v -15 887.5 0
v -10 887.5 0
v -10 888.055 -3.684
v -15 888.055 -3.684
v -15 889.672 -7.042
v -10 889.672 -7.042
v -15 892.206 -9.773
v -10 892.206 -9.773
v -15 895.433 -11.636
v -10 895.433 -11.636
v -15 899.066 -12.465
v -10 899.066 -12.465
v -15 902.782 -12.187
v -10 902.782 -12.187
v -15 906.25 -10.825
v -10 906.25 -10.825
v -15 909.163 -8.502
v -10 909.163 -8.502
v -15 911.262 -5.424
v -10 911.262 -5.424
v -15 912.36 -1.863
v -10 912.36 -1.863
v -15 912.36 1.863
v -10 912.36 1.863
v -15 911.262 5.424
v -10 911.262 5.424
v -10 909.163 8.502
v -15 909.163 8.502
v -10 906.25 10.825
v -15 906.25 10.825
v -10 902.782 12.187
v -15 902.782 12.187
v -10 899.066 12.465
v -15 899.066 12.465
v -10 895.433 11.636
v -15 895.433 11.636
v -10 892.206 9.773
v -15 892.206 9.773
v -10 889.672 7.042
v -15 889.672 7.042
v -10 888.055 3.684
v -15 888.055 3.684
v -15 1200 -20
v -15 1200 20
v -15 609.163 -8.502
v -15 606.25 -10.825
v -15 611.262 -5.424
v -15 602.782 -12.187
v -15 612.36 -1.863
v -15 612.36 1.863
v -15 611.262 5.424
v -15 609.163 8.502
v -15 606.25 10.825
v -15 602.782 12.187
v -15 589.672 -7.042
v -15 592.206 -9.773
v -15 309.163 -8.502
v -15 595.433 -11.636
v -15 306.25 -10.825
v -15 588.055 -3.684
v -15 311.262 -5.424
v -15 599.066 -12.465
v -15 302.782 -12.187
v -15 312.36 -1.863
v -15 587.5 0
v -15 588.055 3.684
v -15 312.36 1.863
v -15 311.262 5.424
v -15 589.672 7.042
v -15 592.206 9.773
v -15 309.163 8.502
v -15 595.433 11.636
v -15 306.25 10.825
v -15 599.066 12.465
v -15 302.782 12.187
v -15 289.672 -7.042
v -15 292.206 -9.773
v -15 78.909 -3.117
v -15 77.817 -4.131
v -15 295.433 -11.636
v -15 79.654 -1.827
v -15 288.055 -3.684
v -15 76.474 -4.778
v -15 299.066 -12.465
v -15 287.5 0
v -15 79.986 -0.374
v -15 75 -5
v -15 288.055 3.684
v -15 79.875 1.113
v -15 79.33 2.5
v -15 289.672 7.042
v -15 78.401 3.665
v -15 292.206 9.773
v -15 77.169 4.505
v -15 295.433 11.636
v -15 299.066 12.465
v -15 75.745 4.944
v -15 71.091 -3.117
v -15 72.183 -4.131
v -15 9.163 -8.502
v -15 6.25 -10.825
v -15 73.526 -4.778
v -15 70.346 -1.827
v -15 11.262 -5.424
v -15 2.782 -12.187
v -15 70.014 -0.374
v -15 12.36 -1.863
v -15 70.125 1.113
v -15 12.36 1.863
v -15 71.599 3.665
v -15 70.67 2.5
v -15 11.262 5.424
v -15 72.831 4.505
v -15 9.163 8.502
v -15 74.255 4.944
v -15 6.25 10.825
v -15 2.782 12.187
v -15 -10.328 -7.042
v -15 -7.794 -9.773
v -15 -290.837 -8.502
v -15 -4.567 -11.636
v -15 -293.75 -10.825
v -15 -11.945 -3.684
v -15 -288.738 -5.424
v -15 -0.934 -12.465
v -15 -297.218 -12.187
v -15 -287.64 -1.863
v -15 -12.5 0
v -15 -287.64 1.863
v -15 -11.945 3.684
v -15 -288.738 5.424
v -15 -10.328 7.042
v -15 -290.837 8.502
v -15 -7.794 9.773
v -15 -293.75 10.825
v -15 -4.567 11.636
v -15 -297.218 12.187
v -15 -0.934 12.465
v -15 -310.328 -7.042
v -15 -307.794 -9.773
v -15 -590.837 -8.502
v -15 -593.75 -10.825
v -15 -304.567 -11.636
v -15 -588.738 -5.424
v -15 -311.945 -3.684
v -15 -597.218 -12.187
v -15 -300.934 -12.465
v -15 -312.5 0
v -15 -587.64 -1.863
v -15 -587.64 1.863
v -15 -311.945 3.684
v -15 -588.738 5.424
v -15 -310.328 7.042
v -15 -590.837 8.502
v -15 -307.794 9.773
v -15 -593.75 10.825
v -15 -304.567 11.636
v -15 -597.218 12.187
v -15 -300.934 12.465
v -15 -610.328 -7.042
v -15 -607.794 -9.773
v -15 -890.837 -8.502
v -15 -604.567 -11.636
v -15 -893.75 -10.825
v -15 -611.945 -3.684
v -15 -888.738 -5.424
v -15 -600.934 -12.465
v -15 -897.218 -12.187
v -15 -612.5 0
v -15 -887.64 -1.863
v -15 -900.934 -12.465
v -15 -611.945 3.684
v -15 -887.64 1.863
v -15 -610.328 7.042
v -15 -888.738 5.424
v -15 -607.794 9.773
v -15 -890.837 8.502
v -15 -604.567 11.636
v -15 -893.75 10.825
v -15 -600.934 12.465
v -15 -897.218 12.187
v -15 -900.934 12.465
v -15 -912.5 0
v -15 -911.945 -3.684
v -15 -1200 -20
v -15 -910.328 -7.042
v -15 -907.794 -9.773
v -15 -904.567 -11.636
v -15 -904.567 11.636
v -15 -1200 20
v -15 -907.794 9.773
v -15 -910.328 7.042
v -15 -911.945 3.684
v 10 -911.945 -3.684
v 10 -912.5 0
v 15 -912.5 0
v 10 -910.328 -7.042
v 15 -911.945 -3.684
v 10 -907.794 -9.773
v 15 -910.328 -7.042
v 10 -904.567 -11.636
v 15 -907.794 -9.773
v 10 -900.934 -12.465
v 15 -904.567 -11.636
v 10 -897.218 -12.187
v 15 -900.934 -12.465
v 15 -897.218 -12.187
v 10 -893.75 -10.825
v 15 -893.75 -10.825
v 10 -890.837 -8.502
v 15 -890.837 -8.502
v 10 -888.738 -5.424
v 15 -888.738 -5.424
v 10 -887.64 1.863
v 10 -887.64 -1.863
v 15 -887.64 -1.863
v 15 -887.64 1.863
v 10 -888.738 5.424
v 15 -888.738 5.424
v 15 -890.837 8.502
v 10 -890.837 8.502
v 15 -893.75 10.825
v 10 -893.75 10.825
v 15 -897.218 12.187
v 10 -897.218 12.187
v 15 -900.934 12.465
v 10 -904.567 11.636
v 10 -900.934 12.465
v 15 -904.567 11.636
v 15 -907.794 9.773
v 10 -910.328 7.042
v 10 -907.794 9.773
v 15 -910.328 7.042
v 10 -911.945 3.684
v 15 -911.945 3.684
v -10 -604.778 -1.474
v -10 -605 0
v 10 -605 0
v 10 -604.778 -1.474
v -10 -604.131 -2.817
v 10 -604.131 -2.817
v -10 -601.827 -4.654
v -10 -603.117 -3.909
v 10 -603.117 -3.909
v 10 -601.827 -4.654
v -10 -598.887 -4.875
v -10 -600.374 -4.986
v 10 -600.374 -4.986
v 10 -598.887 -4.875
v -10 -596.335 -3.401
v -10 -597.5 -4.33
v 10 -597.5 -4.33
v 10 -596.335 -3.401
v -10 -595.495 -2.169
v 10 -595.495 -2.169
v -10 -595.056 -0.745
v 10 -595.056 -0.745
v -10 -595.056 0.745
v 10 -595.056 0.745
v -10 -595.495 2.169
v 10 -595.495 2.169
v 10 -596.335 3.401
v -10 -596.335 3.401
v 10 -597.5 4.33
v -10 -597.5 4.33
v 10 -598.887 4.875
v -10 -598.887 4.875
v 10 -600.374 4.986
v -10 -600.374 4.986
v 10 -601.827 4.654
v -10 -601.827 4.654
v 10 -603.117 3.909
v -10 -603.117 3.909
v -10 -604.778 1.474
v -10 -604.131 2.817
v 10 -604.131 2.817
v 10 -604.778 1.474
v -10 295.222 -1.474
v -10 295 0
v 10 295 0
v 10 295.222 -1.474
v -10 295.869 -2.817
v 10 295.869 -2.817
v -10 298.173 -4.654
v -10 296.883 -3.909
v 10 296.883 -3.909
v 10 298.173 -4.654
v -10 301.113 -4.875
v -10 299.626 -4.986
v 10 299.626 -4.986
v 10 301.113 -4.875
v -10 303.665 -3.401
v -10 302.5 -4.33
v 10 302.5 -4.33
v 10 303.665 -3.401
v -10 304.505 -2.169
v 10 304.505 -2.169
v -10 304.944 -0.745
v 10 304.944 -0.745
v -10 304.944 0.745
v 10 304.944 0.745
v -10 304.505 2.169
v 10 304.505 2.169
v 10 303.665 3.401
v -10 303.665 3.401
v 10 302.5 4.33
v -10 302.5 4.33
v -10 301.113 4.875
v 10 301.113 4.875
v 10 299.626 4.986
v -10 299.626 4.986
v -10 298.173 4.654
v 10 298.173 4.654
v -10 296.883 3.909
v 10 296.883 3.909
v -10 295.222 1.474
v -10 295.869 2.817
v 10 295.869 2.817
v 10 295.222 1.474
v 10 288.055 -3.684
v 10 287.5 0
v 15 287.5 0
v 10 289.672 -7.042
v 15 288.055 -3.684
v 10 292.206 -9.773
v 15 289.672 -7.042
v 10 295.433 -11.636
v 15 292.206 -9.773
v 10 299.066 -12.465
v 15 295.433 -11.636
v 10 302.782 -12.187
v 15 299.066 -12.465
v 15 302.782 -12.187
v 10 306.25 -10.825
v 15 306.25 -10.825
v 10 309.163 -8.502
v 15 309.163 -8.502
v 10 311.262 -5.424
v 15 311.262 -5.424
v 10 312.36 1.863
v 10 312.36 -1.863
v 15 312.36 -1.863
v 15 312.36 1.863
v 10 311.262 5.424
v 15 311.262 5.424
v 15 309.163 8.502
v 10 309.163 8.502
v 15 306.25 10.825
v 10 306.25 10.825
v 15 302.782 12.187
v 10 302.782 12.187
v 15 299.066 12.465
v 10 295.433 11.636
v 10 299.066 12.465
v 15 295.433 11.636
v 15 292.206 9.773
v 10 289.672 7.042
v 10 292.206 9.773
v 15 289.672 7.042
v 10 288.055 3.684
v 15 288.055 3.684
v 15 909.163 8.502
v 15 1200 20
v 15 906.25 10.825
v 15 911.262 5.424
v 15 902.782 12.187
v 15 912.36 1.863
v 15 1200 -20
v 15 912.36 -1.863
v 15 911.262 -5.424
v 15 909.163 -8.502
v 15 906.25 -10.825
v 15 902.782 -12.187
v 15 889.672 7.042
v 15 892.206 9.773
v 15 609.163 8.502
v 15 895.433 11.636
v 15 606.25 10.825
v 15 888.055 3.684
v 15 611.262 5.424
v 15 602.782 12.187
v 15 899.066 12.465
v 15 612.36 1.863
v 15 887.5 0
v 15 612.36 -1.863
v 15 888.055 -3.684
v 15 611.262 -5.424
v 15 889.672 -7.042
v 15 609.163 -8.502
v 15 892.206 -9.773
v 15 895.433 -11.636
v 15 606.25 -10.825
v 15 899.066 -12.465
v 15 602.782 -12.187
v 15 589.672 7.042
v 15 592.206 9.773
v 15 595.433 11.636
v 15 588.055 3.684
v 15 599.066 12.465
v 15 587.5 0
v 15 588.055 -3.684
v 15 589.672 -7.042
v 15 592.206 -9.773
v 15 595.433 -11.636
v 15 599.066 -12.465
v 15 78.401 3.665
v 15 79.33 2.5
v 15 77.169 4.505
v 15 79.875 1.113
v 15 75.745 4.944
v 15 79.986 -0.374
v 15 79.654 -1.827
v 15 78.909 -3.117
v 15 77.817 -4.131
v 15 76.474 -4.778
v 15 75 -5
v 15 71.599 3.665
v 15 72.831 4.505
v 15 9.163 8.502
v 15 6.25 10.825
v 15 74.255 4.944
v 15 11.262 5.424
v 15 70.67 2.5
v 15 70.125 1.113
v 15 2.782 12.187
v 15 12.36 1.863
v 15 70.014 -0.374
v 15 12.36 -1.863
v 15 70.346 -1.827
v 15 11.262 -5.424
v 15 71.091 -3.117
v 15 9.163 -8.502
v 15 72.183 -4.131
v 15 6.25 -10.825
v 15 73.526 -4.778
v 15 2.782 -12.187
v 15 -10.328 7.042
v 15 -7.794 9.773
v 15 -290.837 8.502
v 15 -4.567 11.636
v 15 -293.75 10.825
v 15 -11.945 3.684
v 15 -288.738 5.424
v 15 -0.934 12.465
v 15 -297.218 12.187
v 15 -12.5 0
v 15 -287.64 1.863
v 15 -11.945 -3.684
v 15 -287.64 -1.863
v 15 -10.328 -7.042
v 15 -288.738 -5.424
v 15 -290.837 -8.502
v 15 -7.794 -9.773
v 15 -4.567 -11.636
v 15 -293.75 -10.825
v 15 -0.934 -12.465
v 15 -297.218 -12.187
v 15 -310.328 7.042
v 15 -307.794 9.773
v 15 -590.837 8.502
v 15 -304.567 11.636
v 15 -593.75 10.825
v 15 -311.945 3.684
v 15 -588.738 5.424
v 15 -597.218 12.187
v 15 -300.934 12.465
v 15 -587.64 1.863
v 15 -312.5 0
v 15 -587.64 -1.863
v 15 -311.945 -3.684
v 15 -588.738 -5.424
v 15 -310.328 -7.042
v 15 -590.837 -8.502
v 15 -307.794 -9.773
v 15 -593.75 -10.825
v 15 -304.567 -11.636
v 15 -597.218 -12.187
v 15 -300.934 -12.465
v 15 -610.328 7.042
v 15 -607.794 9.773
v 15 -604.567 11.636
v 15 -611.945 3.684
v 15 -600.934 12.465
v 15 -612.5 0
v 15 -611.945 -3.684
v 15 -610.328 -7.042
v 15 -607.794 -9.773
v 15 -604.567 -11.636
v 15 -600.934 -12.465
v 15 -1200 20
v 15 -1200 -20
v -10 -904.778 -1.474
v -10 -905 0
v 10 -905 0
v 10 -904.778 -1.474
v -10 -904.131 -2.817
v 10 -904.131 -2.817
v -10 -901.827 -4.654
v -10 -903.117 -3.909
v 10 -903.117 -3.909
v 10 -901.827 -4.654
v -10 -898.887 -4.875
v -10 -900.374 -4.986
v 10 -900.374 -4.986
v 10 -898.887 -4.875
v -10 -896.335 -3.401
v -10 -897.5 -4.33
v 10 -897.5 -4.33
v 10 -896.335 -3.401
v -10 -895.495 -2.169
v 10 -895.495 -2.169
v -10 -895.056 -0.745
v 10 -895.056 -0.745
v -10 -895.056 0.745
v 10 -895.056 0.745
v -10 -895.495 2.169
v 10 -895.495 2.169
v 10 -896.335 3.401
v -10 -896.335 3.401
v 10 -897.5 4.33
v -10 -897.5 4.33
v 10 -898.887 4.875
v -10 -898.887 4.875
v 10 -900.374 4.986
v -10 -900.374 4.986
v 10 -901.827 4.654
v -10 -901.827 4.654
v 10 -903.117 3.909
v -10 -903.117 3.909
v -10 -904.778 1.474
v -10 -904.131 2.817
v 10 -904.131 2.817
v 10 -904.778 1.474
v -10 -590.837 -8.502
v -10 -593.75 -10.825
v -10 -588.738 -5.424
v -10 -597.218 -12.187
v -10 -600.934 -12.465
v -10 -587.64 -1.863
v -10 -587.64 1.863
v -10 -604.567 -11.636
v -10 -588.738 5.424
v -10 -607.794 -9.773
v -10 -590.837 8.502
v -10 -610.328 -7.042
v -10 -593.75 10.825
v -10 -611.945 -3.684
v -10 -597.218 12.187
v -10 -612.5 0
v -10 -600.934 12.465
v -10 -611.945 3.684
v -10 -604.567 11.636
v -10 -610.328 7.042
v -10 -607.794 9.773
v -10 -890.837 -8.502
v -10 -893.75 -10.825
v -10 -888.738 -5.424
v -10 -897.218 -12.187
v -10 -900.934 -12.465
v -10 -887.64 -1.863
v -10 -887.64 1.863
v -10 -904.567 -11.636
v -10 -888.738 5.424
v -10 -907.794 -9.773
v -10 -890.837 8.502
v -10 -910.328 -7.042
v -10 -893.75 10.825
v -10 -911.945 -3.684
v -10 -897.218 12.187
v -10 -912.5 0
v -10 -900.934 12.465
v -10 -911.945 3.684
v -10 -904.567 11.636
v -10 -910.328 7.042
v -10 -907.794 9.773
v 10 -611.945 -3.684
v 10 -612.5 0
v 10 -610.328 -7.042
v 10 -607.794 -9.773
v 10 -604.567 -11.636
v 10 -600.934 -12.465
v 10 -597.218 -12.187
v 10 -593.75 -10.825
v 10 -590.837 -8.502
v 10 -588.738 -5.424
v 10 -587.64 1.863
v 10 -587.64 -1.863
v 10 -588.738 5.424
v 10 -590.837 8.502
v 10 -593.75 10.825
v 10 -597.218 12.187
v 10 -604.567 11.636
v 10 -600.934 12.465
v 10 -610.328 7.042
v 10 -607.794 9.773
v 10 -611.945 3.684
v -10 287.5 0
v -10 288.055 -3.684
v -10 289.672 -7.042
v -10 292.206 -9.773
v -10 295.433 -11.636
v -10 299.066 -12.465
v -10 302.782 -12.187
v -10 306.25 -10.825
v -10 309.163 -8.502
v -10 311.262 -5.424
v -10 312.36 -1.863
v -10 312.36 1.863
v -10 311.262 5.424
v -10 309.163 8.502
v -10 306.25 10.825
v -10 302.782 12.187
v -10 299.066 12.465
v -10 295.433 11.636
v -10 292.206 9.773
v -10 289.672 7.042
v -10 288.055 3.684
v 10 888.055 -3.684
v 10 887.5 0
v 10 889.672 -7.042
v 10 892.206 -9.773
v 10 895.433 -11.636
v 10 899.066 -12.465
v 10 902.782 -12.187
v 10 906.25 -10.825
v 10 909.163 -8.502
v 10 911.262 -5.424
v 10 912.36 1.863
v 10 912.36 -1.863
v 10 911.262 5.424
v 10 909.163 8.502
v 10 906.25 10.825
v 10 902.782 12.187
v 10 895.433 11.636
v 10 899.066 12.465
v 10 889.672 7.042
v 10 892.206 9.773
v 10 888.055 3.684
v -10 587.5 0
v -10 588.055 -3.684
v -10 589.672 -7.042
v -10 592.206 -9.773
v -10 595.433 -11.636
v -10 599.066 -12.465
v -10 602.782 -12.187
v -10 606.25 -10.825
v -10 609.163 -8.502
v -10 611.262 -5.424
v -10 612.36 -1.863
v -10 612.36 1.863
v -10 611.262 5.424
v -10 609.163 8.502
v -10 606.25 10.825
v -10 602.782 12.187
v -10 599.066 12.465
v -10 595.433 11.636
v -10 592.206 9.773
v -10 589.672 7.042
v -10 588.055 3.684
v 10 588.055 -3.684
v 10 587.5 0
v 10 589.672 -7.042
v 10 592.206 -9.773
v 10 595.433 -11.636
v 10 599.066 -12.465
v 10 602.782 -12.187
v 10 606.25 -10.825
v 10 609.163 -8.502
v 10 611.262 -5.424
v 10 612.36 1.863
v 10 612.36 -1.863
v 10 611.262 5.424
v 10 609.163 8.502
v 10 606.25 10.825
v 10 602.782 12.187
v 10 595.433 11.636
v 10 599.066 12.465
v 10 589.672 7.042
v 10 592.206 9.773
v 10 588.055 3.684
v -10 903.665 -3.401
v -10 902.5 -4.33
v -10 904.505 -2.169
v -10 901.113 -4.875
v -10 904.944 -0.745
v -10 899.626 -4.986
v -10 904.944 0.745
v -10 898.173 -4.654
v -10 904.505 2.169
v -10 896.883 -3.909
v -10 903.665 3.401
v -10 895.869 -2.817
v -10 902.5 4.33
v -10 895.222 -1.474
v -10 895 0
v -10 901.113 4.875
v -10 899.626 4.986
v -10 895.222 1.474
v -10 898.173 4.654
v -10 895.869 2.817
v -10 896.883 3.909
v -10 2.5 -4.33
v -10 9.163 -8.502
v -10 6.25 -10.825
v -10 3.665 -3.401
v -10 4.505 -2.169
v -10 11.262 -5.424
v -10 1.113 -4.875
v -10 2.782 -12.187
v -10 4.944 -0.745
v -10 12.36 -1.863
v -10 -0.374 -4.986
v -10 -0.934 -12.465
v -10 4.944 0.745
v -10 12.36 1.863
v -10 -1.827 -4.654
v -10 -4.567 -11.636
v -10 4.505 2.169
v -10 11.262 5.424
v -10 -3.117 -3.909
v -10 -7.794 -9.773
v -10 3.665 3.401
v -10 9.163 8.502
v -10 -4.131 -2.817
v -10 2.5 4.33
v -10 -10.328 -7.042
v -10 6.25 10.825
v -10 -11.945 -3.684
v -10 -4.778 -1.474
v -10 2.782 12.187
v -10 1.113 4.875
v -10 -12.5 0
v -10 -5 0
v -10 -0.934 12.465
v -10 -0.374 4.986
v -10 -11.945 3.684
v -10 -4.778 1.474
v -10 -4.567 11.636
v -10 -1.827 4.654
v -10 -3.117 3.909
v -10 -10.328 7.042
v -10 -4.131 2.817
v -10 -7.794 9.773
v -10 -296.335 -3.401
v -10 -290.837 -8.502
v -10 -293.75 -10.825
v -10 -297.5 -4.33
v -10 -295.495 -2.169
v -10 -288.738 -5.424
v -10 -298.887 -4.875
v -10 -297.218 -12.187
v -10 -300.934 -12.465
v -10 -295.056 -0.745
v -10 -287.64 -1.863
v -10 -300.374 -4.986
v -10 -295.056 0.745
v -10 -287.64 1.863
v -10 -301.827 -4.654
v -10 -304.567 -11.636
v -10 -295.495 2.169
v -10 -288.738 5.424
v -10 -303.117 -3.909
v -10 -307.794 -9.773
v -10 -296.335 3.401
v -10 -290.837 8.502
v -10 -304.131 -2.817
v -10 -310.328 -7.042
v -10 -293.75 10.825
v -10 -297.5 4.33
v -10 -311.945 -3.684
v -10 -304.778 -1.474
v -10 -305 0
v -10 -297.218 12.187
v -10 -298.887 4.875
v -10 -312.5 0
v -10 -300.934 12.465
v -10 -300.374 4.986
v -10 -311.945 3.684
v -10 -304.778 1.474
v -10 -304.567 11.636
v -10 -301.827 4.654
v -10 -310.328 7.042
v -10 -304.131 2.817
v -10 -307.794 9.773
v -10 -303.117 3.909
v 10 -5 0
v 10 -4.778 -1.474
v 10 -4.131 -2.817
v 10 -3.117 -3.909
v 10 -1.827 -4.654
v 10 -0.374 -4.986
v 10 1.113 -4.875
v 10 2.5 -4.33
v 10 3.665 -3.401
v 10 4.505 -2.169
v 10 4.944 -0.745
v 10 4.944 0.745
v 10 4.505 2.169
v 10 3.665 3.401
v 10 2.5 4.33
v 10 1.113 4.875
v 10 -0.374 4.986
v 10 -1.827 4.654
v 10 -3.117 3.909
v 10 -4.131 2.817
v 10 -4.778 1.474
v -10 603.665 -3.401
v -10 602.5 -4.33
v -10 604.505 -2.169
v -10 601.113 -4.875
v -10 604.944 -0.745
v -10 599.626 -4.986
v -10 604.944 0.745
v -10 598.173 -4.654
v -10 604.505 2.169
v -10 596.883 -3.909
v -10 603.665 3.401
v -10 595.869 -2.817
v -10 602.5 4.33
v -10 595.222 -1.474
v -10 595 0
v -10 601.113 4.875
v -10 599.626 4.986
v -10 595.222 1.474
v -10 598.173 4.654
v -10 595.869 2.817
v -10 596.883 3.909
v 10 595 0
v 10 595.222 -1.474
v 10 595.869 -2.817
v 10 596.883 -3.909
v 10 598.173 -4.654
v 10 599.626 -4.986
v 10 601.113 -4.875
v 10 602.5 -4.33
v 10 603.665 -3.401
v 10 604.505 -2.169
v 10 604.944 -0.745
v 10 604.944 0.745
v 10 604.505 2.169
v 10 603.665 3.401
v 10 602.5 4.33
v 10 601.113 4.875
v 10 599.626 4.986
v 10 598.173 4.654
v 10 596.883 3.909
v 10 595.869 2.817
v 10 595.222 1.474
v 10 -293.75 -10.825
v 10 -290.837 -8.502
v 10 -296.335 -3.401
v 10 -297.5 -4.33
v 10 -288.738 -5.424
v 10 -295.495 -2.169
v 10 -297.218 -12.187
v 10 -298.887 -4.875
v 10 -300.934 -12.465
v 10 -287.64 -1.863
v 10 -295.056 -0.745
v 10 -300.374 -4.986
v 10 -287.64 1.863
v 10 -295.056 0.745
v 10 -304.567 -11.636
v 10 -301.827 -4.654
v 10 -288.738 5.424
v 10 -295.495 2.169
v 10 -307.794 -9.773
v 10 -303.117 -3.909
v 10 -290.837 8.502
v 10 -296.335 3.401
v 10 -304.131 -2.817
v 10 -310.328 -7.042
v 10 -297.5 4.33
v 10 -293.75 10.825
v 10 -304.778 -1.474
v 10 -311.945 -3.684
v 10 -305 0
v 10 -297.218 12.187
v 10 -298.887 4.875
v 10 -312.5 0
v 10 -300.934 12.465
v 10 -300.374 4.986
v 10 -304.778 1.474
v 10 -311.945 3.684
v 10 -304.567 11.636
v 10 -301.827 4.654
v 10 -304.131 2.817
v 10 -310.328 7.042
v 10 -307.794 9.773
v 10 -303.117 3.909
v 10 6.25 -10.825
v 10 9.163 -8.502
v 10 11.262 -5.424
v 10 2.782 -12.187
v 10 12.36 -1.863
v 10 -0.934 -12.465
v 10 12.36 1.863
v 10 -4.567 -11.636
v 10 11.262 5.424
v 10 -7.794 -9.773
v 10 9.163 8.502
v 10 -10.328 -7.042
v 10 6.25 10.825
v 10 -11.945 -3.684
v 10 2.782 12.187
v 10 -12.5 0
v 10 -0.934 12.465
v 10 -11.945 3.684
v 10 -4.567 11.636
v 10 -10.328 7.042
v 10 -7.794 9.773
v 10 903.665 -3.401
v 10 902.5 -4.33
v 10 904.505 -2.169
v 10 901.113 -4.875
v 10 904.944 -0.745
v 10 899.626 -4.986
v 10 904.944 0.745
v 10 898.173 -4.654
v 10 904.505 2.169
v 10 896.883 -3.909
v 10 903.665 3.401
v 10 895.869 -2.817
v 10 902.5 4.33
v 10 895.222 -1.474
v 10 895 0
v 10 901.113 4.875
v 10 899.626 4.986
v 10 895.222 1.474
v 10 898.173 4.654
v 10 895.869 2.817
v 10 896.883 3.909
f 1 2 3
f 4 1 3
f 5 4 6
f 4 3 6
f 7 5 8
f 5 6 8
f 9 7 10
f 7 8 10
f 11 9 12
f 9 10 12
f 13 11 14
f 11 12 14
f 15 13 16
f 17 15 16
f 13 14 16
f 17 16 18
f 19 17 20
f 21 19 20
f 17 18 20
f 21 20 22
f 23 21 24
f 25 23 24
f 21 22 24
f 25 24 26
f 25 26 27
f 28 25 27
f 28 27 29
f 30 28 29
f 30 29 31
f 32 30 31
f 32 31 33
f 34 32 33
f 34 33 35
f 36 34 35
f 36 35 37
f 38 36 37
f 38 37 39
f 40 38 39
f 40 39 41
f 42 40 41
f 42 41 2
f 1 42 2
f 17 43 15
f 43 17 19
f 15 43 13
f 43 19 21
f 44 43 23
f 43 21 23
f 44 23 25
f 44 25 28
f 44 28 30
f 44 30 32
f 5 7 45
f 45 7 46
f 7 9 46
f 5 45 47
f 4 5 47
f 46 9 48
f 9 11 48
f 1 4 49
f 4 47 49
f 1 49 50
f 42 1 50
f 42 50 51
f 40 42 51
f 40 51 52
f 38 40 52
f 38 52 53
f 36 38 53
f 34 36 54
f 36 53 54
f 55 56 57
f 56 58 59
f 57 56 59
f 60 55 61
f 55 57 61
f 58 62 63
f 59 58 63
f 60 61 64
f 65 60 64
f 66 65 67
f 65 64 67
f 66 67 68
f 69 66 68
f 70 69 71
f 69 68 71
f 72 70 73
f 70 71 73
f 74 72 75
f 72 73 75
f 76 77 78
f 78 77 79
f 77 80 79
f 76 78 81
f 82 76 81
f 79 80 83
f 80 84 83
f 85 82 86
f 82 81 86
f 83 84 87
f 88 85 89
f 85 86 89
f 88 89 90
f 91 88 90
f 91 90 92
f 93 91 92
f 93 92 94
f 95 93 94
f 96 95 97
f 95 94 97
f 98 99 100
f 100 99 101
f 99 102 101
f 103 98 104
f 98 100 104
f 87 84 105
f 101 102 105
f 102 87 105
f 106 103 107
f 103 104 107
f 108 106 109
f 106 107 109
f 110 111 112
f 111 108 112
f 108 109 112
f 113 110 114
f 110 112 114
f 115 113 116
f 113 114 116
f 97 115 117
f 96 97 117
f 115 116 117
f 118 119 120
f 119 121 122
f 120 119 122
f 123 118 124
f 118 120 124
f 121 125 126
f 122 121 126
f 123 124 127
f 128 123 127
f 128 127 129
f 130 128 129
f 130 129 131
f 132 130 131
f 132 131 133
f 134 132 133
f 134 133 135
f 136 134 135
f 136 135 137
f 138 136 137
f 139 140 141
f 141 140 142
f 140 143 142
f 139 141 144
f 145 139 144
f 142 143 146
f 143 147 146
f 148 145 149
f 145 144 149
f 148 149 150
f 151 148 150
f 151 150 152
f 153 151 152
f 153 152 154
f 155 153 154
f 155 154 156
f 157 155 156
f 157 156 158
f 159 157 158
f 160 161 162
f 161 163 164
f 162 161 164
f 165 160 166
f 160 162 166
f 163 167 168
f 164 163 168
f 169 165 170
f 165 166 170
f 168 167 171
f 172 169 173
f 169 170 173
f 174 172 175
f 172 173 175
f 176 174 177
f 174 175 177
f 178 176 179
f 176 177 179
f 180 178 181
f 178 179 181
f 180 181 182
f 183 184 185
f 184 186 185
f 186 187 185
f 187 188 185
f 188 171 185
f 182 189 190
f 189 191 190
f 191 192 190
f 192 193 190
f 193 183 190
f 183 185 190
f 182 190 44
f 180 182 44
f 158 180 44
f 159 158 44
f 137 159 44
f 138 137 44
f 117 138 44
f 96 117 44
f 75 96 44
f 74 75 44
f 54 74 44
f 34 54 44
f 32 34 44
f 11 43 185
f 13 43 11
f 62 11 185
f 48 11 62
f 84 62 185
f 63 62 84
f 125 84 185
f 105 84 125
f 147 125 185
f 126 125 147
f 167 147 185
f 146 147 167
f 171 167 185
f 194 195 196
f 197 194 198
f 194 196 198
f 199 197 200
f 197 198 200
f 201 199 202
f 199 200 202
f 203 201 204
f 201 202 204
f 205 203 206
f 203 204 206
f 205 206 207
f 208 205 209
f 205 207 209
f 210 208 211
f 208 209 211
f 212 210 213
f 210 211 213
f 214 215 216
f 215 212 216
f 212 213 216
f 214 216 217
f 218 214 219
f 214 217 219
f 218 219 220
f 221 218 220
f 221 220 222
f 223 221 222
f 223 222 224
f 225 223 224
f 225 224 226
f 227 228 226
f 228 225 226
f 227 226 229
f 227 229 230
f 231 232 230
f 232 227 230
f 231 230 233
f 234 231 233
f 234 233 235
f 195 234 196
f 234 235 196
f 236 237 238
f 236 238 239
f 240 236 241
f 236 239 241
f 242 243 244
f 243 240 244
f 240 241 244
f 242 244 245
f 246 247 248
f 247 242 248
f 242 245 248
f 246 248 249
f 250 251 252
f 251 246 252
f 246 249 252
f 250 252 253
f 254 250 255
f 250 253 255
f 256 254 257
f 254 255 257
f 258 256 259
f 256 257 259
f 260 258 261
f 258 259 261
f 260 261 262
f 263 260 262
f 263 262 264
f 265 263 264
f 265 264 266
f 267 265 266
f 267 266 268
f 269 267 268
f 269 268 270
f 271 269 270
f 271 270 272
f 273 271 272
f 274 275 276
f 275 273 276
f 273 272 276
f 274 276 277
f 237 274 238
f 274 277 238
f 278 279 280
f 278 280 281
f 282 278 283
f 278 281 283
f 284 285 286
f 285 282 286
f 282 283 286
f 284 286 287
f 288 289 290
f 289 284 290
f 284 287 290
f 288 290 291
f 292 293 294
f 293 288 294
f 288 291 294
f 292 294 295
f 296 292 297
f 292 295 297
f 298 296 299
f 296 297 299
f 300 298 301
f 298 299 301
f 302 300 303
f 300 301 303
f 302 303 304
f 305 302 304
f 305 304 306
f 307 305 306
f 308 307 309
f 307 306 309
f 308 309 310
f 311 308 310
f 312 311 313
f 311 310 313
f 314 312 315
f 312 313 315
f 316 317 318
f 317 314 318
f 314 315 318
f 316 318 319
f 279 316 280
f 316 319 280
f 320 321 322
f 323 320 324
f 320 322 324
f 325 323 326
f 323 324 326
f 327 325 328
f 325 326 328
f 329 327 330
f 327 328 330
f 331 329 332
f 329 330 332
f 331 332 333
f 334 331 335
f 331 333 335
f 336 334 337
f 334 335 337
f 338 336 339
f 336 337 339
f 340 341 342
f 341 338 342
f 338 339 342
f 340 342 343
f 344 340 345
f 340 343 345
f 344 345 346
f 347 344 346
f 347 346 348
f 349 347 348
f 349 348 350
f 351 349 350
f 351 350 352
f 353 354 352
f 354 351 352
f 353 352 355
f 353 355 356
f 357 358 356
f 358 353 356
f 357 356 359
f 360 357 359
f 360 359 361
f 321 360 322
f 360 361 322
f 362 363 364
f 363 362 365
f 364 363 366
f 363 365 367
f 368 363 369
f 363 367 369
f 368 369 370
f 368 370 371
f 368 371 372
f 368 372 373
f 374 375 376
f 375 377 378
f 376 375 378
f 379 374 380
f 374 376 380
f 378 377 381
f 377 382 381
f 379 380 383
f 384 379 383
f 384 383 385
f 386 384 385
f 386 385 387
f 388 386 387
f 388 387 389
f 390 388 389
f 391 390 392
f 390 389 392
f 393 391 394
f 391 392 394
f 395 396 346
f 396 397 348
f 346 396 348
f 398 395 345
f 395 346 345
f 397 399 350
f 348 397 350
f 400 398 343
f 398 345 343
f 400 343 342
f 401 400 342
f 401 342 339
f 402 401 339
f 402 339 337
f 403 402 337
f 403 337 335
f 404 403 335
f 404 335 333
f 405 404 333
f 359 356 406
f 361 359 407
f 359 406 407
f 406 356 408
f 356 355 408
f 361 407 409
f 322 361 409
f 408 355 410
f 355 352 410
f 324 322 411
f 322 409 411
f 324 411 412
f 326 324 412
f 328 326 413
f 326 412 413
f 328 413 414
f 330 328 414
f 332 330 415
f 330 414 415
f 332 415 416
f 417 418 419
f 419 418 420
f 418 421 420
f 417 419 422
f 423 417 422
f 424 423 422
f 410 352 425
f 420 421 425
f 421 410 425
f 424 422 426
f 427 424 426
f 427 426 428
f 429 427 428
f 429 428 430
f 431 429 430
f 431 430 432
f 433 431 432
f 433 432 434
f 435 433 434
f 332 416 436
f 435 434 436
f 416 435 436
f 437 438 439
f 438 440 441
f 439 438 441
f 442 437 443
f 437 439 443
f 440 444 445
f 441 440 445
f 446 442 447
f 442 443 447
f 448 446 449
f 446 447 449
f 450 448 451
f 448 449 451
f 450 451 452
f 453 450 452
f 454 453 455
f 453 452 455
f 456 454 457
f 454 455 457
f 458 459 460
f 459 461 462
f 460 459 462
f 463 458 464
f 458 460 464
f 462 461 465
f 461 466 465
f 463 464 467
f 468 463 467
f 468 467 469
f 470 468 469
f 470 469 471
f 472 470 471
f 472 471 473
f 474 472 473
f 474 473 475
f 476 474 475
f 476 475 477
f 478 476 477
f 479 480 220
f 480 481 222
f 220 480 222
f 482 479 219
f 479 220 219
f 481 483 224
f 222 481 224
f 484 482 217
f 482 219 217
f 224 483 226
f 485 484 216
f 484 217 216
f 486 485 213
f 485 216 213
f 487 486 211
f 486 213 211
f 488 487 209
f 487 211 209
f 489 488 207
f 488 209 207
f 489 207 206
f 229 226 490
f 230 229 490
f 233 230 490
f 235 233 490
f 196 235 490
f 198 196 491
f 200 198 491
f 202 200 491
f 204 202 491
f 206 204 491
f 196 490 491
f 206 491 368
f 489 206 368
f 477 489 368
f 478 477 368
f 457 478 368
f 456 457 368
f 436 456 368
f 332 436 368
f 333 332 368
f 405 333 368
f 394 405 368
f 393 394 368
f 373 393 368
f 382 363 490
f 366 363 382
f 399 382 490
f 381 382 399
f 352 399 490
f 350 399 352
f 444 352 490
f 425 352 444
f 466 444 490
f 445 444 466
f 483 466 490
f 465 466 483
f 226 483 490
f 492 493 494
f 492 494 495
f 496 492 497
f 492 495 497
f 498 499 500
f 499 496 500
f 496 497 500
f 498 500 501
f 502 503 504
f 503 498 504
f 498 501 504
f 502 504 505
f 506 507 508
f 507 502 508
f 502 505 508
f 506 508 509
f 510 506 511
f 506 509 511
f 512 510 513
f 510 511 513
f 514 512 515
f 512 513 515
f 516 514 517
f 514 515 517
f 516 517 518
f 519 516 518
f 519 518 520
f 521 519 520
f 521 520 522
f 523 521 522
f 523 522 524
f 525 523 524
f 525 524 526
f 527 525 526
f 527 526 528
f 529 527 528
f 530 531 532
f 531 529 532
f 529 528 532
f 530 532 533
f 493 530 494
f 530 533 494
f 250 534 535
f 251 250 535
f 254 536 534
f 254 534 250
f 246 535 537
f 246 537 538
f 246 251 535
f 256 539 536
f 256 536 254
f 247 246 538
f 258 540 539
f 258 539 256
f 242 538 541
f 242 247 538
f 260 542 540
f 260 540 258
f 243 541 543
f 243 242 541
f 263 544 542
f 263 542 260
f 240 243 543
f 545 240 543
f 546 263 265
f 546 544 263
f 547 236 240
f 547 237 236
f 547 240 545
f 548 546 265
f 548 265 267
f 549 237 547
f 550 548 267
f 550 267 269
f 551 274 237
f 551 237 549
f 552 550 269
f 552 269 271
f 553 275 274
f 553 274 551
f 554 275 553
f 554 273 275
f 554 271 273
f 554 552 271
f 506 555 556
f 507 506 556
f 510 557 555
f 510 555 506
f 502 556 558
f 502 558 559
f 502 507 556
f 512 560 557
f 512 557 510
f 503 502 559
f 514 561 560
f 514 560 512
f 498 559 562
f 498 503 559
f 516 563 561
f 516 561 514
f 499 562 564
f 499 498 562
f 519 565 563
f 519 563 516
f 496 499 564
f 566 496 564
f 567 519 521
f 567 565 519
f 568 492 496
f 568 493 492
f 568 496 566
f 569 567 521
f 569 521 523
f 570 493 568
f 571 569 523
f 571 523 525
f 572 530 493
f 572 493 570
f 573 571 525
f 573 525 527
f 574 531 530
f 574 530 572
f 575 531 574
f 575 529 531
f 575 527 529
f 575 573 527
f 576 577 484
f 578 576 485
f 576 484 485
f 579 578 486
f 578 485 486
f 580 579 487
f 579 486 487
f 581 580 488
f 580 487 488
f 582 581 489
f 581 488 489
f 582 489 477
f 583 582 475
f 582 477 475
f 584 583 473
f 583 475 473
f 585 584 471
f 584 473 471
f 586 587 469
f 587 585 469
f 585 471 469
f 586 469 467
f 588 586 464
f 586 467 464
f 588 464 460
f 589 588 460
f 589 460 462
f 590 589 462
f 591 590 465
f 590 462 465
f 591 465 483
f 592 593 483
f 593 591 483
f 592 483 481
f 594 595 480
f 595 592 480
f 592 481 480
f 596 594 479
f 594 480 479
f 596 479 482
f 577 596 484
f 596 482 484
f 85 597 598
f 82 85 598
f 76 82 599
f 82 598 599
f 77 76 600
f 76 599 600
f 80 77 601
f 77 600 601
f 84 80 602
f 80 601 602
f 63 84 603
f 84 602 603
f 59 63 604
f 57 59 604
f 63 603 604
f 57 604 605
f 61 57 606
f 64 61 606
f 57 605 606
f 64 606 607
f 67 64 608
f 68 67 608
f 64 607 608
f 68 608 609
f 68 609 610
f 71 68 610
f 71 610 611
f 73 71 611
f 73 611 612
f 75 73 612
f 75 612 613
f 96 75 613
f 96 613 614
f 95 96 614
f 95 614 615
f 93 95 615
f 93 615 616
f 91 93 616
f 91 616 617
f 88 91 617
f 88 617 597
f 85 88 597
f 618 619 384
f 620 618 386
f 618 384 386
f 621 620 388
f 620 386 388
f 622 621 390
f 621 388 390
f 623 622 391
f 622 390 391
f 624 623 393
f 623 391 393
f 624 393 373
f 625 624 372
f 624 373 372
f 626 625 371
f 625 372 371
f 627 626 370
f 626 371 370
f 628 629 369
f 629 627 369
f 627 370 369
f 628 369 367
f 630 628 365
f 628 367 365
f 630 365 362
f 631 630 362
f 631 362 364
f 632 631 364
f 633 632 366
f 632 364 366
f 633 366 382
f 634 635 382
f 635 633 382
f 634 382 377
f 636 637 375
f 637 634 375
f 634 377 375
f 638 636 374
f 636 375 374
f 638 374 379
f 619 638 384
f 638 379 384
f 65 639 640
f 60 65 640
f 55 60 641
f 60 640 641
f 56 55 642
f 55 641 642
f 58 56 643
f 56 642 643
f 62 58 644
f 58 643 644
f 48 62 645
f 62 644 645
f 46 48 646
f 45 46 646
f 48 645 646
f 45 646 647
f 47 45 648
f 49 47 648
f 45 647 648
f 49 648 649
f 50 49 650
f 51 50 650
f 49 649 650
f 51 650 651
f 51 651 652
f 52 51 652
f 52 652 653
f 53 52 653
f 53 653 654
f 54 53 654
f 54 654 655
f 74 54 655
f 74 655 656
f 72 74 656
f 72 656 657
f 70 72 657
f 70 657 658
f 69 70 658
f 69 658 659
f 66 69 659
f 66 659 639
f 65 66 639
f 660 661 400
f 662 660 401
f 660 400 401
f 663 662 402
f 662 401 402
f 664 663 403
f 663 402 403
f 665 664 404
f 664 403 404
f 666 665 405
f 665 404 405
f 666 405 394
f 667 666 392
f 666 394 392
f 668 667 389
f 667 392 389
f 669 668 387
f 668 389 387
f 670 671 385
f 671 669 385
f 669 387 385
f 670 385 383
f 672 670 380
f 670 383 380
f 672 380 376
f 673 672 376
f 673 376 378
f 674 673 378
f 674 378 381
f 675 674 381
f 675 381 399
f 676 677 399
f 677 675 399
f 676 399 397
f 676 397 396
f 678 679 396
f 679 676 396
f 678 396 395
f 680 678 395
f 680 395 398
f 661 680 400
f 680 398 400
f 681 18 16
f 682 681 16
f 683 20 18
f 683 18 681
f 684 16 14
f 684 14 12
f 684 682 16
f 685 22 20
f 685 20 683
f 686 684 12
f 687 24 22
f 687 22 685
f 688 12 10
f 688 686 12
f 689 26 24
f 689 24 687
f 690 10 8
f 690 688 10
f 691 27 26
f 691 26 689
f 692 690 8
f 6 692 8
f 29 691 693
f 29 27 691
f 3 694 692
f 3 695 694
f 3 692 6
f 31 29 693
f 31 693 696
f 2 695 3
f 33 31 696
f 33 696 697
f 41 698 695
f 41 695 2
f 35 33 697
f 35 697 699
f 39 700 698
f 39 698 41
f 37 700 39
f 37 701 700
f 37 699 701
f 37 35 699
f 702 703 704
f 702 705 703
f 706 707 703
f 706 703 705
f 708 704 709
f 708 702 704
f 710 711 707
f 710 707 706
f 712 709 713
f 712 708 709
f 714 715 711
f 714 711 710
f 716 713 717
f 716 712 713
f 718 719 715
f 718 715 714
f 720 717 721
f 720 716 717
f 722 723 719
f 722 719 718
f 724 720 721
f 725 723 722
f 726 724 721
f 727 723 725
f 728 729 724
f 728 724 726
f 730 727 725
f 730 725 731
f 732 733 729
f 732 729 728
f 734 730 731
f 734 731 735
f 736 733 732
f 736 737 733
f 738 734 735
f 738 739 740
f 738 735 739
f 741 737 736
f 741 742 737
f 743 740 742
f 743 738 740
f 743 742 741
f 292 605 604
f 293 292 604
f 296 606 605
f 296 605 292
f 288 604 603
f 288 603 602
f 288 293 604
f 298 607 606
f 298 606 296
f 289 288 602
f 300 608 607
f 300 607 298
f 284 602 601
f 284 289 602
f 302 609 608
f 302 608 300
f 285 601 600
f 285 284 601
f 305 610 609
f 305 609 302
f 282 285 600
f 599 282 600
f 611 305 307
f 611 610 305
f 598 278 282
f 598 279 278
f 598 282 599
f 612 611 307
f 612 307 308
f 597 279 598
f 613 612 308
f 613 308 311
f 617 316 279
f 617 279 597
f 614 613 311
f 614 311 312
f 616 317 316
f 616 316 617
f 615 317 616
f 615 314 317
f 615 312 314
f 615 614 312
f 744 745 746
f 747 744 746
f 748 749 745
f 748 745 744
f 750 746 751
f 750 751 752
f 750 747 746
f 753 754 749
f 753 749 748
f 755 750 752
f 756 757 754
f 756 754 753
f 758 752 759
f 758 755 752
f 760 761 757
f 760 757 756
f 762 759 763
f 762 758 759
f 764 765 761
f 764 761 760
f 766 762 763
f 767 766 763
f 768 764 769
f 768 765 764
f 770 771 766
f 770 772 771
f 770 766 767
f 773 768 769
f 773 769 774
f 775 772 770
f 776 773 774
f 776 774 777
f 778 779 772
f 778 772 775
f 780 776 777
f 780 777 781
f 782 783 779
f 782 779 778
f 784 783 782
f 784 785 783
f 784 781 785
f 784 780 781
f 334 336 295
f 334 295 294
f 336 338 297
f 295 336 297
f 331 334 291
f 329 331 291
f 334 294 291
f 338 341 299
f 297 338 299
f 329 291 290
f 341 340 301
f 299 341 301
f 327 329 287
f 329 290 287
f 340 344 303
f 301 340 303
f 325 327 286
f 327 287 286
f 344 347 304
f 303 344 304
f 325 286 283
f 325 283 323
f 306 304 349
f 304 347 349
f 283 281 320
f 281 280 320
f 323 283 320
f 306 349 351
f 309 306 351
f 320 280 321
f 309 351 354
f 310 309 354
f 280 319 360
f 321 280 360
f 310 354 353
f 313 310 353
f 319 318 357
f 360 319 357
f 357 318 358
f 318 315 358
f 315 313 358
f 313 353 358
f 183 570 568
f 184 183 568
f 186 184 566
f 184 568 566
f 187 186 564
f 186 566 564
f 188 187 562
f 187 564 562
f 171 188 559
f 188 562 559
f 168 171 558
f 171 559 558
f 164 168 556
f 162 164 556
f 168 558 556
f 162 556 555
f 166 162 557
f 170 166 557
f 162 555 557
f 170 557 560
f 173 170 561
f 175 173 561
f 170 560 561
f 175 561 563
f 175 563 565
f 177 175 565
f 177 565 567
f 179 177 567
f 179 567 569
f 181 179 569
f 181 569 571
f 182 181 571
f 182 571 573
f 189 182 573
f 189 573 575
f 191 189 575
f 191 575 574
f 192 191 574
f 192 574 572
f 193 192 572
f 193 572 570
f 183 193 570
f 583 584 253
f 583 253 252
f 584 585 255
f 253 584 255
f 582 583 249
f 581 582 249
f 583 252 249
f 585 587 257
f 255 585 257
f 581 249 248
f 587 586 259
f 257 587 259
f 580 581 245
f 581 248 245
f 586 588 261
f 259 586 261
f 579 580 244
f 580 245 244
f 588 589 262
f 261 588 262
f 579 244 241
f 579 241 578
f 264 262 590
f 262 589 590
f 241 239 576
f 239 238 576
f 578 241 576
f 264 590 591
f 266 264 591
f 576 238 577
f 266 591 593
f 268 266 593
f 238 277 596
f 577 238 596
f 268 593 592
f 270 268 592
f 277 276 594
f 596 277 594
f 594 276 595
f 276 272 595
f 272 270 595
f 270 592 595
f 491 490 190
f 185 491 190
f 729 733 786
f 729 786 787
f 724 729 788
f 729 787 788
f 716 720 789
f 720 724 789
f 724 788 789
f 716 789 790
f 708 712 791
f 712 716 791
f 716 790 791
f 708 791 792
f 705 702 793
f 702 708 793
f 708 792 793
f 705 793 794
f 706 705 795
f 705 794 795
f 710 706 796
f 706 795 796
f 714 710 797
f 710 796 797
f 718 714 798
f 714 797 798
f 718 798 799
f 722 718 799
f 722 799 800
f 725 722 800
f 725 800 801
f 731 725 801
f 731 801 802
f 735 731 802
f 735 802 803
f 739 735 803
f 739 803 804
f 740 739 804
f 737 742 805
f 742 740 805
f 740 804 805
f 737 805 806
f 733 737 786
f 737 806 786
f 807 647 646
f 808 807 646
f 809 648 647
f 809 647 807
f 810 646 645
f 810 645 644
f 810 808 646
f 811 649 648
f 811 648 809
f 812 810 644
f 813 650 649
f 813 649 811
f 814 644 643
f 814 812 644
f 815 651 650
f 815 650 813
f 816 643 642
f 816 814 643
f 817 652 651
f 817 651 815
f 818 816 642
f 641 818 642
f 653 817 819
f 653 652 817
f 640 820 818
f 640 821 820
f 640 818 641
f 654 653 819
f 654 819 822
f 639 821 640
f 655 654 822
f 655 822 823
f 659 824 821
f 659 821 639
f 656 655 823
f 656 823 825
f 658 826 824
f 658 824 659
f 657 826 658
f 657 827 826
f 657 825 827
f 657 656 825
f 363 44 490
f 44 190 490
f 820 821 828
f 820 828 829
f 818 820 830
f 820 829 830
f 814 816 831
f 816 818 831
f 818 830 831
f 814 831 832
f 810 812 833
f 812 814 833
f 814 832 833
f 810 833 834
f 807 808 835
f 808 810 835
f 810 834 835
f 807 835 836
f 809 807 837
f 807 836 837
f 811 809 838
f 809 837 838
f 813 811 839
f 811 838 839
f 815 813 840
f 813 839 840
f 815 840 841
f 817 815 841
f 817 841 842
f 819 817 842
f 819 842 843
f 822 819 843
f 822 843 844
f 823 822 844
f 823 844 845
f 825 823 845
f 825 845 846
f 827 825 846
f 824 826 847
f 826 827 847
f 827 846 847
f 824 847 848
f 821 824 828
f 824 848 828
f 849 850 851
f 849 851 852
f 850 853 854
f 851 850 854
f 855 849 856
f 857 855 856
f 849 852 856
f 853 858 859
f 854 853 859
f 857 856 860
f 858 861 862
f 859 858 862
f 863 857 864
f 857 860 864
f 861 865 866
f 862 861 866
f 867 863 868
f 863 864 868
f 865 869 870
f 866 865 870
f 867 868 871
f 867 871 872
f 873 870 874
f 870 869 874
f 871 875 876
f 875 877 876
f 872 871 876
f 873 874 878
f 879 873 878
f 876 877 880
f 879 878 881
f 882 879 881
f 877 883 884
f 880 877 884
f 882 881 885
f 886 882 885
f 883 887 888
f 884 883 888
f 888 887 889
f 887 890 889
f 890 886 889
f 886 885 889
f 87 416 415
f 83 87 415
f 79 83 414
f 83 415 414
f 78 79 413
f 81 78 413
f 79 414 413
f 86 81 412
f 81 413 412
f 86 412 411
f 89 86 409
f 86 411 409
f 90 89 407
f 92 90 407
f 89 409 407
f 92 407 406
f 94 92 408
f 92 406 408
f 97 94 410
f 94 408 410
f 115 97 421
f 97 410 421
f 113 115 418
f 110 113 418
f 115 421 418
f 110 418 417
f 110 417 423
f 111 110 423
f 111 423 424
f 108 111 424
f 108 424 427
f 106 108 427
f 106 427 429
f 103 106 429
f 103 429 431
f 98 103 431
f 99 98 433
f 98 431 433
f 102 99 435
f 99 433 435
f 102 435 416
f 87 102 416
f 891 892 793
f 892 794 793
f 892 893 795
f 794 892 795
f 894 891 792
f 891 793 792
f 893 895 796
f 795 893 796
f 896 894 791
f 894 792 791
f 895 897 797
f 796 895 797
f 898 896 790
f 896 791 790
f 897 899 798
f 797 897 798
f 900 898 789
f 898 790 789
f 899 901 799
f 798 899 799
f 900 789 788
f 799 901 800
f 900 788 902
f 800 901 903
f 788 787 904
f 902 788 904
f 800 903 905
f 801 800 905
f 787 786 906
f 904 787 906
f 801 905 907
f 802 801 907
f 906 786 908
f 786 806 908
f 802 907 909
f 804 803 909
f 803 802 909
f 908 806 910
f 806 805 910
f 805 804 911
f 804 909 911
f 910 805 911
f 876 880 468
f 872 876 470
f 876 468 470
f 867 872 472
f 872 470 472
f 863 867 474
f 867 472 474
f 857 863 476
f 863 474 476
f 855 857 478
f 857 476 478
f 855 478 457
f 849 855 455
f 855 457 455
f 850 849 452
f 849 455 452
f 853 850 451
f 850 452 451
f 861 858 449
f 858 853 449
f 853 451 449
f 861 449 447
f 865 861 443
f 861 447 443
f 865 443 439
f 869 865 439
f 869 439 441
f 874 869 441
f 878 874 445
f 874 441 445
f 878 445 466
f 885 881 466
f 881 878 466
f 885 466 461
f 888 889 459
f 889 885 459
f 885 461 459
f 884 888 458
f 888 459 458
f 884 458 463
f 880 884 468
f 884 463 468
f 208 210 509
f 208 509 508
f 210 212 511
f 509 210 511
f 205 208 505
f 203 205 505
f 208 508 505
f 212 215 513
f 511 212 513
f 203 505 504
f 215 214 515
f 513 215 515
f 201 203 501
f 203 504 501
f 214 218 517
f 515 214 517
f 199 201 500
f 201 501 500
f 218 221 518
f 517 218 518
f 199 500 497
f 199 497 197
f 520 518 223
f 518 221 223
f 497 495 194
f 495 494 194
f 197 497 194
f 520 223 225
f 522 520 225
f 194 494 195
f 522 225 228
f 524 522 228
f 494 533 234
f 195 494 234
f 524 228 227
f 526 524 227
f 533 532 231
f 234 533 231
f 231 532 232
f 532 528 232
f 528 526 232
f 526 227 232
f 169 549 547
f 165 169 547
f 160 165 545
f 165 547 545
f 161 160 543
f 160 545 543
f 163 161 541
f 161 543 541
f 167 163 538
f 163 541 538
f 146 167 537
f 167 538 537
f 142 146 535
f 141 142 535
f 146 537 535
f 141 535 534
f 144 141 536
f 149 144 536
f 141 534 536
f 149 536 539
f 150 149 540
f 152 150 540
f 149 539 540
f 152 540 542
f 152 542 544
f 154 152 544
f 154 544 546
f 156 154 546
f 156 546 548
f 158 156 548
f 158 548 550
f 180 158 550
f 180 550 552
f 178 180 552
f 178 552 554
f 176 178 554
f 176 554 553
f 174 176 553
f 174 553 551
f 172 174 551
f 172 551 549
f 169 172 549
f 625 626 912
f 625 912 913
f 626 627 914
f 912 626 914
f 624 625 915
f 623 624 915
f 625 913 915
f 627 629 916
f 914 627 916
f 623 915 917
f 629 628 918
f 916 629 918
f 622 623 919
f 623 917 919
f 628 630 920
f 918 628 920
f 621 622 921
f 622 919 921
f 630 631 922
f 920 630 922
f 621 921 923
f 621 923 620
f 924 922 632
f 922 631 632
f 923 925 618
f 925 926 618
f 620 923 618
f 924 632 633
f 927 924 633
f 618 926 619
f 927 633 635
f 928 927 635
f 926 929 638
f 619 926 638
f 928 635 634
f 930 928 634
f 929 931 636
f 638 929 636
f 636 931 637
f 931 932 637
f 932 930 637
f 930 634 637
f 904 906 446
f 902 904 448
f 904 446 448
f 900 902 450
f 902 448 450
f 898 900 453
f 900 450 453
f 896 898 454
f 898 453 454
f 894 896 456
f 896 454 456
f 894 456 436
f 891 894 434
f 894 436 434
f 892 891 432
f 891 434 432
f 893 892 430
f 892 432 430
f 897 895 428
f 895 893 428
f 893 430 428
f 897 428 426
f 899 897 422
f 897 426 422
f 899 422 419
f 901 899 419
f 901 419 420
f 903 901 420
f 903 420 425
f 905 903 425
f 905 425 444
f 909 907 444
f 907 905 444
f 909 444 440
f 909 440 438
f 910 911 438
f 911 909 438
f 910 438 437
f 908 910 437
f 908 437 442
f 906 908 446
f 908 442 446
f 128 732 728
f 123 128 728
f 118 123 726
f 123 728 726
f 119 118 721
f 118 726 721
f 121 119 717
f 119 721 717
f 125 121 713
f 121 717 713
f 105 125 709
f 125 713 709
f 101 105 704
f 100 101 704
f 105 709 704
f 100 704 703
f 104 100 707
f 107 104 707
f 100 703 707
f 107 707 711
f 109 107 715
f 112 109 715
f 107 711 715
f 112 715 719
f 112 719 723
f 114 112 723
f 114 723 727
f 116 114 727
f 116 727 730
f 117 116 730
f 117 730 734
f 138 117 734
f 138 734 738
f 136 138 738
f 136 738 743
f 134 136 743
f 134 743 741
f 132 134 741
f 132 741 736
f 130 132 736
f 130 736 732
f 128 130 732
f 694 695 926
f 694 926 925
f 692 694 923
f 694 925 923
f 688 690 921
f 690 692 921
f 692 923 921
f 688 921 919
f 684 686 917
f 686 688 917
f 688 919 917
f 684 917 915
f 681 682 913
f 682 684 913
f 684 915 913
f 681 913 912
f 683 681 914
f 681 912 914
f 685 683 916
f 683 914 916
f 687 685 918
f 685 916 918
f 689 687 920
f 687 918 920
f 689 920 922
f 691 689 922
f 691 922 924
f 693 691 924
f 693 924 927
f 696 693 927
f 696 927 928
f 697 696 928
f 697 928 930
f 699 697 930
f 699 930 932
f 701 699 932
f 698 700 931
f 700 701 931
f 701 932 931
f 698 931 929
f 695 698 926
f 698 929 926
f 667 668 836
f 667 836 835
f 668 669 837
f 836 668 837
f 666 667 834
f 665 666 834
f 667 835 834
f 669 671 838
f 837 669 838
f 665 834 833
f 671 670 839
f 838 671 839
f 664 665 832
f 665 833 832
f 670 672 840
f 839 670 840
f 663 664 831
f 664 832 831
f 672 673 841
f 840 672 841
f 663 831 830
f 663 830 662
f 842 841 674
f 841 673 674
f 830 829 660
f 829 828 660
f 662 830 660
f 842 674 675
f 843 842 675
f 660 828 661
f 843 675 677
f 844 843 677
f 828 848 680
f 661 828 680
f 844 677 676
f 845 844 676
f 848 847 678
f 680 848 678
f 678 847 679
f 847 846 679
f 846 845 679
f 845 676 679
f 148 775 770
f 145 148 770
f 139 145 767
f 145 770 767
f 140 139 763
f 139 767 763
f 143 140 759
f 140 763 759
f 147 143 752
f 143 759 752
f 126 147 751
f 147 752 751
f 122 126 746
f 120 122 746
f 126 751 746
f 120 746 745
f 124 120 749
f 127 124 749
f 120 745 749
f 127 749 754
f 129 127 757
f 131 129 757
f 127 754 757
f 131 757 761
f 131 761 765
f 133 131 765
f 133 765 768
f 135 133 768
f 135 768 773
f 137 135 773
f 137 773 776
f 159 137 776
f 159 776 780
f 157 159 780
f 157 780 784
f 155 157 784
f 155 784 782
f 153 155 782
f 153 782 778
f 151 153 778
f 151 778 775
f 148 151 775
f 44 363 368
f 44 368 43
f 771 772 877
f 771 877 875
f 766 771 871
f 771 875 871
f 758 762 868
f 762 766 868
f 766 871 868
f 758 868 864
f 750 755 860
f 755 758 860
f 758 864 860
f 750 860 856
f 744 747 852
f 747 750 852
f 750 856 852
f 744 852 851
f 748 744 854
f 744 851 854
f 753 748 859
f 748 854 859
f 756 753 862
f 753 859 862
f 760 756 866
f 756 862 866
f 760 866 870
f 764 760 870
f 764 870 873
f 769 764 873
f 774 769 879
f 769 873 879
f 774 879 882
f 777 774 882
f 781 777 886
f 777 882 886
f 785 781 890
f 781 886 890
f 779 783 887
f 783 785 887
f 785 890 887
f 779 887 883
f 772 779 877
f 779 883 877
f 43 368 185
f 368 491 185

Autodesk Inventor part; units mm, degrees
ref_plane "YZ Plane" through (0, 0, 0) normal (1, 0, 0) x (0, 1, 0)
ref_plane "XZ Plane" through (0, 0, 0) normal (0, 1, 0) x (-1, 0, 0)
ref_plane "XY Plane" through (0, 0, 0) normal (0, 0, 1) x (1, 0, 0)
sketch "Sketch1" plane through (0, 0, 0) normal (0, 1, 0) x (-1, 0, 0)
  line L0 (15, 20) -> (-15, 20)
  line L1 (-15, 20) -> (-15, -20)
  line L2 (-15, -20) -> (15, -20)
  line L3 (15, -20) -> (15, 20)
  point P0 (0, 0)
  point P1 (15, 0)
  point P2 (0, -20)
  dimension "d0" = 40
  dimension "d1" = 30
extrude "Extrusion1" add sketch "Sketch1" along normal mid plane 2400
sketch "Sketch2" plane through (0, 0, 0) normal (0, 0, 1) x (1, 0, 0)
  line L0 (35, 0) -> (-35, 0)
  line L1 (-35, 0) -> (-35, -12.5)
  line L2 (-35, -12.5) -> (-10, -12.5)
  line L3 (-10, -12.5) -> (-10, -5)
  line L4 (-10, -5) -> (10, -5)
  line L5 (10, -5) -> (10, -12.5)
  line L6 (10, -12.5) -> (35, -12.5)
  line L7 (35, -12.5) -> (35, 0)
  point P0 (0, 0)
  point P1 (0, 0)
  dimension "d4" = 10
  dimension "d5" = 70
  dimension "d6" = 25
  dimension "d7" = 20
revolve "Revolution1" cut sketch "Sketch2" angle 360 about axis through (35, 0, 0) along (-1, 0, 0)
pattern_linear "Rectangular Pattern1" count 7 spacing 300 along (0, 1, 0) of "Revolution1" first direction both ways yes
sketch "Sketch3" plane through (15, -1200, -20) normal (1, 0, 0) x (0, 0, -1)
  circle A0 centre (-20, 1275) radius 5
  point P0 (-20, 1200)
  dimension "d12" = 10
  dimension "d13" = 75
extrude "Extrusion2" cut sketch "Sketch3" against normal through all
